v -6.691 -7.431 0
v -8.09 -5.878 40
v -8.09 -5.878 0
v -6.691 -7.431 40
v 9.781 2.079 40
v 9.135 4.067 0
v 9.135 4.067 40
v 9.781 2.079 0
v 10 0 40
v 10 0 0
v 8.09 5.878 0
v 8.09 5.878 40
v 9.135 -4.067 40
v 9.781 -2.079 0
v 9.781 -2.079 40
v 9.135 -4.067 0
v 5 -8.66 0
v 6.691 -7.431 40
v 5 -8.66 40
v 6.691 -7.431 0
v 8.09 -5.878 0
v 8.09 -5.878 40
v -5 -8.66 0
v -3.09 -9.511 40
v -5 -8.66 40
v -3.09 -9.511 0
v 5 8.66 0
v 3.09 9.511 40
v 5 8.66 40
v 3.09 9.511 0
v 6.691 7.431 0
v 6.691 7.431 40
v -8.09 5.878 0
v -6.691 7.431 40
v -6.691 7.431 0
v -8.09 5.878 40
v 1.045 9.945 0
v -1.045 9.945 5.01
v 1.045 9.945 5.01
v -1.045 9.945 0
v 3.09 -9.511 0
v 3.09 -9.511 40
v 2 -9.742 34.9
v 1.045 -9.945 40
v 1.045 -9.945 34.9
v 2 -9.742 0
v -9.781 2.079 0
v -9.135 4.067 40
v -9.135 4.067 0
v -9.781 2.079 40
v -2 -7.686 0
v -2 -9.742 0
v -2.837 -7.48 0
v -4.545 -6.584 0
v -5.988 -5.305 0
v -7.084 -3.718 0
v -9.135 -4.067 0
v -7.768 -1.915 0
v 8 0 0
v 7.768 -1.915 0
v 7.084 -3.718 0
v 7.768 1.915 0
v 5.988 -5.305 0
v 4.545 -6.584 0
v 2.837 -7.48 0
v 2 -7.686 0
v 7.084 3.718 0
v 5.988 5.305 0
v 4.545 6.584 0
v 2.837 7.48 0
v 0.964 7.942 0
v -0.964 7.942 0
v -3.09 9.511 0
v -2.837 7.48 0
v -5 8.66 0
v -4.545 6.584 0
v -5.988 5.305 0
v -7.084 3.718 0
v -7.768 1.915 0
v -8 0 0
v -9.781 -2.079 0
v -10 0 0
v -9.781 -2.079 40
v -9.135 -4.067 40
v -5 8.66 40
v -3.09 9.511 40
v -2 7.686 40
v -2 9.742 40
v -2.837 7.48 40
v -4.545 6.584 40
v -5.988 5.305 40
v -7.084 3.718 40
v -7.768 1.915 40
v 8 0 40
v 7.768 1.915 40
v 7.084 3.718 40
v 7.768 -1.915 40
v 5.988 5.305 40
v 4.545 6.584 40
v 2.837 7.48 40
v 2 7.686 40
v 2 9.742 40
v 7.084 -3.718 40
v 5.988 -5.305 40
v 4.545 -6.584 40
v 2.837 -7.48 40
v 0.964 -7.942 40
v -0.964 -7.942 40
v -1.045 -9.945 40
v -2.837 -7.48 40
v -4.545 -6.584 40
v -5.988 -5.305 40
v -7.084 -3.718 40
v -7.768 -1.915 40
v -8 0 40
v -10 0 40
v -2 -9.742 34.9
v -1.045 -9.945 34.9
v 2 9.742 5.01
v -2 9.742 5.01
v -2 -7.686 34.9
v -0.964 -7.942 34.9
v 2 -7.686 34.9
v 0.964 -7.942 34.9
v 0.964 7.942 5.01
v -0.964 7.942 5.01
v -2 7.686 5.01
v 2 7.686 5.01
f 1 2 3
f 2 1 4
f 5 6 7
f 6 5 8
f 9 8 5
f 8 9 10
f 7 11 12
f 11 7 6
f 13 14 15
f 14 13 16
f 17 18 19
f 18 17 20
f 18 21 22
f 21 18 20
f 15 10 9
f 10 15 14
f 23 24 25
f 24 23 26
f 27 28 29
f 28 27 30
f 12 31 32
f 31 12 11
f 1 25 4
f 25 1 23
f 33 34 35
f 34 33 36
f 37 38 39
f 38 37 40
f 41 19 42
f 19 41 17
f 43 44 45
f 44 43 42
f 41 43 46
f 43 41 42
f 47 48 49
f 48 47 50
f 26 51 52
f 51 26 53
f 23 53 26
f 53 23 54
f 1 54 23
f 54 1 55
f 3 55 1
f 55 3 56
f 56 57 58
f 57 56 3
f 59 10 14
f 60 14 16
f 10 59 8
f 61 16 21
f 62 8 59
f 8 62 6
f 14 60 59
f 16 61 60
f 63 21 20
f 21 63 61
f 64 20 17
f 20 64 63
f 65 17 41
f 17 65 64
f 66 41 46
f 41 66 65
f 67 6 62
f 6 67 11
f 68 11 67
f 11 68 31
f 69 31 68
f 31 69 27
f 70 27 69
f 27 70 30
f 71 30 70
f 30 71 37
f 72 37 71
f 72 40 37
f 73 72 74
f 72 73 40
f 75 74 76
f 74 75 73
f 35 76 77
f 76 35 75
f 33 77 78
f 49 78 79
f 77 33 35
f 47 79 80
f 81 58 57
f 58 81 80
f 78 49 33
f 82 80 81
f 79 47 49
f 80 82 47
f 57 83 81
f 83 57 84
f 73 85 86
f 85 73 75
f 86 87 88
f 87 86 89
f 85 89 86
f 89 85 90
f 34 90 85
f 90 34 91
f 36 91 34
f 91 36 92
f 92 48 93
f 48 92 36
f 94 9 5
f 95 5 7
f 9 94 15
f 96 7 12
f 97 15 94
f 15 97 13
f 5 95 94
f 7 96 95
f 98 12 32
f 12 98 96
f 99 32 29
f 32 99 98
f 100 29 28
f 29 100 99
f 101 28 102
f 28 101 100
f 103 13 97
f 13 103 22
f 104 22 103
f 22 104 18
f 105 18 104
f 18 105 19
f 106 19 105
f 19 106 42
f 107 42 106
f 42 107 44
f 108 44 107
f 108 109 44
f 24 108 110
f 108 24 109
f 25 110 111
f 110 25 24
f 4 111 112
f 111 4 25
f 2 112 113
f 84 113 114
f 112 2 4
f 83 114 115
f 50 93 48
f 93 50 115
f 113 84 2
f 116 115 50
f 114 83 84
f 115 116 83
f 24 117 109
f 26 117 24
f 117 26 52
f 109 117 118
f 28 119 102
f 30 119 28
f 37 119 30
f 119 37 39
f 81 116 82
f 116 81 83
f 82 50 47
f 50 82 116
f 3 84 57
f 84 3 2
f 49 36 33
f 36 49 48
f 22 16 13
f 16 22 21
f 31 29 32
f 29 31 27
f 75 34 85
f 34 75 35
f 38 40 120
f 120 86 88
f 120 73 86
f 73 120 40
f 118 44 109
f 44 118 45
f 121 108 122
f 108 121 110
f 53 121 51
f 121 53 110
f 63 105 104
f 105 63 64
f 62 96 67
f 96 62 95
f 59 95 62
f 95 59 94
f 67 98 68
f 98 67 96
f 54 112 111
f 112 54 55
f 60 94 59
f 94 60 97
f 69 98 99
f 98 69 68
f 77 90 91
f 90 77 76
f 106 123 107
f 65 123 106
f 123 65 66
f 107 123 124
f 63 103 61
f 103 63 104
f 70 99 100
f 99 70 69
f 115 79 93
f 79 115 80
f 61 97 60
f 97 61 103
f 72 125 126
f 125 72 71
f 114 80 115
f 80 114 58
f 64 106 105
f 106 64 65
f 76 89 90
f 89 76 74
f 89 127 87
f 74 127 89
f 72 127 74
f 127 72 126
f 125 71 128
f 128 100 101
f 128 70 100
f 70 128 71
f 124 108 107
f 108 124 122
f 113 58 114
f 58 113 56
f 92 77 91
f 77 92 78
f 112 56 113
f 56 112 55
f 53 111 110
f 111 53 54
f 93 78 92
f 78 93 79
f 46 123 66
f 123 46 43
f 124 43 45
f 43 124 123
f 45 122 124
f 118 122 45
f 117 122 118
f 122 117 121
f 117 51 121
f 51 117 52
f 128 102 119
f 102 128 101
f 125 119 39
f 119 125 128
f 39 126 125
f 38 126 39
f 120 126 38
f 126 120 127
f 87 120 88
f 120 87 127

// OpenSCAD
difference() {
  cylinder(r=10, h=40);

  translate([0, 0, -0.5])
  cylinder(r=8, h=41);

  translate([-2, -10, -0.1])
  cube([4, 4, 35]);

  translate([-2, 7, 5.01])
  cube([4, 4, 35]);
}

translate([0, 0, 20])
# square(size=[30, 30], center=true);
